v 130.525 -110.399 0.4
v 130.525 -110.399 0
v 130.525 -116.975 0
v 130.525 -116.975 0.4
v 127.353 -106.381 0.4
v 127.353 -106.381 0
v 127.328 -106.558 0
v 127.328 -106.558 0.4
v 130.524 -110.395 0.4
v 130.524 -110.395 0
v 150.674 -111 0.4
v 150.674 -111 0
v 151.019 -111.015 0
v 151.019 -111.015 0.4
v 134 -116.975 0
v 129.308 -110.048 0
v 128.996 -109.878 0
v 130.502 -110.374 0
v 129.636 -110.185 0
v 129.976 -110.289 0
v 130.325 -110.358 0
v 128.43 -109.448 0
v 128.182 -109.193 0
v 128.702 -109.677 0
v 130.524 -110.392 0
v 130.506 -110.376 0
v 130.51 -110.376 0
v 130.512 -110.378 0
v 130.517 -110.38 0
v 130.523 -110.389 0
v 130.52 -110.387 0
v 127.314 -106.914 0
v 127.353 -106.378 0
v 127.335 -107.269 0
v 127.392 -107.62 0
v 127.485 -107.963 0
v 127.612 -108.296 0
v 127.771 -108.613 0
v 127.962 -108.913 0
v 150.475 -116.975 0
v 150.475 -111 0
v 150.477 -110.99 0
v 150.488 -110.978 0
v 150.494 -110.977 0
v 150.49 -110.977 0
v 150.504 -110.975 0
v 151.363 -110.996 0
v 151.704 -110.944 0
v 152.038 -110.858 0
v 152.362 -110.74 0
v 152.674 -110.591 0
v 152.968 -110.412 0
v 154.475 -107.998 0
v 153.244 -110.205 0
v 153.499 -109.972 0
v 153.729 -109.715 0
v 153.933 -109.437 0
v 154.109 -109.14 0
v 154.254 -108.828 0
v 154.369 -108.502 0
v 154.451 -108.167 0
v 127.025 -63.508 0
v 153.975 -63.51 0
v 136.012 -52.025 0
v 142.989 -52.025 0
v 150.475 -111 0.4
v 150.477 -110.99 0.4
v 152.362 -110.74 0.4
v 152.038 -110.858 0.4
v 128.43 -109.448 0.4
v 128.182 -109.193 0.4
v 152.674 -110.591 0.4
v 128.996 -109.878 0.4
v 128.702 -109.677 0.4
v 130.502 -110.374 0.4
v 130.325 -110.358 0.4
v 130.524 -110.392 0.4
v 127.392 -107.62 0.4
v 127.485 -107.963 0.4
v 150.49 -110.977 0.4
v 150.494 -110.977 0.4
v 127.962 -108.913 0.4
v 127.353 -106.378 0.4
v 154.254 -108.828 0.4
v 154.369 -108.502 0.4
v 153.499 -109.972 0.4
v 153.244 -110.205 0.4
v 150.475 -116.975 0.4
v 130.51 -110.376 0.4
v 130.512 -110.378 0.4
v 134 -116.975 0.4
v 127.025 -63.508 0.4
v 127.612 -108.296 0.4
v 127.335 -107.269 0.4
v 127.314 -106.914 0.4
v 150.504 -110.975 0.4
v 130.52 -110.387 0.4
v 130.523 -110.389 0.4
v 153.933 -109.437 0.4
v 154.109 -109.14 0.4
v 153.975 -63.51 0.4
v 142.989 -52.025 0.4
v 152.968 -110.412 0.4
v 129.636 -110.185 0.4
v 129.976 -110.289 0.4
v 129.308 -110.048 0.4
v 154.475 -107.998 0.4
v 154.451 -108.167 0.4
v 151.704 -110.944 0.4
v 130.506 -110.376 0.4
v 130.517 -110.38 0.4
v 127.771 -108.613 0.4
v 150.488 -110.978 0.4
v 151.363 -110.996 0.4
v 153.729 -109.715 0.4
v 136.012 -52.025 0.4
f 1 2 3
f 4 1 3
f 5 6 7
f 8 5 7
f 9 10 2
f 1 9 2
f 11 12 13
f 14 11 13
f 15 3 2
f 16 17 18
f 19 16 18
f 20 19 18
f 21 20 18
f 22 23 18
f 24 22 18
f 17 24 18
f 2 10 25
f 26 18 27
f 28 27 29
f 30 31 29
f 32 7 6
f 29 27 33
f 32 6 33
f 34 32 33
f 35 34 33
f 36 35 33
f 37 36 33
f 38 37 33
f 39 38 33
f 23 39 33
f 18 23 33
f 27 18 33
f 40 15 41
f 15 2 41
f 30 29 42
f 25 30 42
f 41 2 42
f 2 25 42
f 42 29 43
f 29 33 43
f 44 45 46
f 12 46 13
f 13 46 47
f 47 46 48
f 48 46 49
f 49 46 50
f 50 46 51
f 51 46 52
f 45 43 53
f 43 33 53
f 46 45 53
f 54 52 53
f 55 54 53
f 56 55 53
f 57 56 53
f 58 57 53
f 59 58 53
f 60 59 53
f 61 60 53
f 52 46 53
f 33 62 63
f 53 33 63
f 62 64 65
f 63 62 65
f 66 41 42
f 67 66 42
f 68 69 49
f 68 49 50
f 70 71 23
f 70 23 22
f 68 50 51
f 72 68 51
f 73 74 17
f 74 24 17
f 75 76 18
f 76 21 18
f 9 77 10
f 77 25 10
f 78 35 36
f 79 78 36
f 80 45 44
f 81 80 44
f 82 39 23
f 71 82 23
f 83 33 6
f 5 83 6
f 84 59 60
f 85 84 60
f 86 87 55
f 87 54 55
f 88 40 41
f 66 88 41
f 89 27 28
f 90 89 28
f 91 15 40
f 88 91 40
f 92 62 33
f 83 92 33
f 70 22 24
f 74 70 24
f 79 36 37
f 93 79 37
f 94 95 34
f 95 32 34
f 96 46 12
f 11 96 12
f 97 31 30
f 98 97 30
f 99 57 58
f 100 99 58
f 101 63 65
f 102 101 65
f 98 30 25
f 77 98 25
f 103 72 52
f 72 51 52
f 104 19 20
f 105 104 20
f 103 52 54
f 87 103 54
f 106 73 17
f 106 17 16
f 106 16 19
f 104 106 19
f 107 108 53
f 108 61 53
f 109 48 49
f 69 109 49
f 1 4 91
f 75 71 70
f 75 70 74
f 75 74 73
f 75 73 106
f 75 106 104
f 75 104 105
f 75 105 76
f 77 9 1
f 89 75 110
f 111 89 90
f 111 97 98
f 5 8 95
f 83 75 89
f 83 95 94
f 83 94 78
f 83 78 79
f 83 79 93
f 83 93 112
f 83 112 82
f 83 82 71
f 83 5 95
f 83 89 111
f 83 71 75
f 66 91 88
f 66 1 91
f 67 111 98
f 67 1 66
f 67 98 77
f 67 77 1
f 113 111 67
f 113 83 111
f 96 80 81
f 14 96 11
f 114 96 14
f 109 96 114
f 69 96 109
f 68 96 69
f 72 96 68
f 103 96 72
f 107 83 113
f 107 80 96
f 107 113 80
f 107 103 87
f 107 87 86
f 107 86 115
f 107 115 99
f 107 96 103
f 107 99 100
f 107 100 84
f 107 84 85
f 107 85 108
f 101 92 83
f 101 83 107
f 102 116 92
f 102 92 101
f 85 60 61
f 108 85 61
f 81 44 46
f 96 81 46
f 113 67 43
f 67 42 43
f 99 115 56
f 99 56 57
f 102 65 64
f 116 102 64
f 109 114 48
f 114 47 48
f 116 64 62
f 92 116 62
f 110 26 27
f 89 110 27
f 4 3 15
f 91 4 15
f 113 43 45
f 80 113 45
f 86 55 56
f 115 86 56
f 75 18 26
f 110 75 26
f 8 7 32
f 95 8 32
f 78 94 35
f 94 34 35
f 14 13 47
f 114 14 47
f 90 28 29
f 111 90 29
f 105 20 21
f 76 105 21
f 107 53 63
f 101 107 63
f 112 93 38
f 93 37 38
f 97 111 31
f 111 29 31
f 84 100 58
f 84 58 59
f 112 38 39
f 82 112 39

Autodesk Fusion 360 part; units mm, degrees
sketch "KiCad Dongle-Edge_Cuts" plane through (0, 0, 0) normal (0, 1, 0) x (1, 0, 0)
  line L0 (143.0096, -51.9769) -> (143.0098, -51.9771)
  line L1 (143.0098, -51.9771) -> (143.0101, -51.9771)
  line L2 (143.0101, -51.9771) -> (143.0181, -51.9827)
  line L3 (143.0181, -51.9827) -> (154.0181, -63.4827)
  line L4 (154.0181, -63.4827) -> (154.0225, -63.4897)
  line L5 (154.0225, -63.4897) -> (154.023, -63.4902)
  line L6 (154.023, -63.4902) -> (154.0231, -63.4906)
  line L7 (154.0231, -63.4906) -> (154.0233, -63.4909)
  line L8 (154.0233, -63.4909) -> (154.0233, -63.4916)
  line L9 (154.0233, -63.4916) -> (154.025, -63.4997)
  line L10 (154.025, -63.4997) -> (154.525, -107.9997)
  line L11 (154.525, -107.9997) -> (154.5245, -108.0022)
  line L12 (154.5245, -108.0022) -> (154.5247, -108.0035)
  line L13 (154.5247, -108.0035) -> (154.4584, -108.3466)
  line L14 (154.4584, -108.3466) -> (154.3588, -108.6815)
  line L15 (154.3588, -108.6815) -> (154.2268, -109.005)
  line L16 (154.2268, -109.005) -> (154.0637, -109.3141)
  line L17 (154.0637, -109.3141) -> (153.8712, -109.6056)
  line L18 (153.8712, -109.6056) -> (153.651, -109.8769)
  line L19 (153.651, -109.8769) -> (153.4052, -110.1253)
  line L20 (153.4052, -110.1253) -> (153.1363, -110.3484)
  line L21 (153.1363, -110.3484) -> (152.8468, -110.5441)
  line L22 (152.8468, -110.5441) -> (152.5396, -110.7105)
  line L23 (152.5396, -110.7105) -> (152.2175, -110.8459)
  line L24 (152.2175, -110.8459) -> (151.8837, -110.9491)
  line L25 (151.8837, -110.9491) -> (151.5413, -111.0191)
  line L26 (151.5413, -111.0191) -> (151.1938, -111.0553)
  line L27 (151.1938, -111.0553) -> (150.8444, -111.0571)
  line L28 (150.8444, -111.0571) -> (150.525, -111.0274)
  line L29 (150.525, -111.0274) -> (150.525, -117)
  line L30 (150.525, -117) -> (150.5231, -117.0096)
  line L31 (150.5231, -117.0096) -> (150.5096, -117.0231)
  line L32 (150.5096, -117.0231) -> (150.5, -117.025)
  line L33 (150.5, -117.025) -> (134, -117.025)
  line L34 (134, -117.025) -> (130.5, -117.025)
  line L35 (130.5, -117.025) -> (130.4904, -117.0231)
  line L36 (130.4904, -117.0231) -> (130.4769, -117.0096)
  line L37 (130.4769, -117.0096) -> (130.475, -117)
  line L38 (130.475, -117) -> (130.475, -110.4205)
  line L39 (130.475, -110.4205) -> (130.1411, -110.3722)
  line L40 (130.1411, -110.3722) -> (129.7916, -110.2849)
  line L41 (129.7916, -110.2849) -> (129.4527, -110.1627)
  line L42 (129.4527, -110.1627) -> (129.1278, -110.0068)
  line L43 (129.1278, -110.0068) -> (128.8204, -109.819)
  line L44 (128.8204, -109.819) -> (128.5336, -109.601)
  line L45 (128.5336, -109.601) -> (128.2702, -109.3552)
  line L46 (128.2702, -109.3552) -> (128.033, -109.084)
  line L47 (128.033, -109.084) -> (127.8245, -108.7902)
  line L48 (127.8245, -108.7902) -> (127.6467, -108.4768)
  line L49 (127.6467, -108.4768) -> (127.5015, -108.1471)
  line L50 (127.5015, -108.1471) -> (127.3903, -107.8044)
  line L51 (127.3903, -107.8044) -> (127.3144, -107.4522)
  line L52 (127.3144, -107.4522) -> (127.2744, -107.0942)
  line L53 (127.2744, -107.0942) -> (127.2708, -106.7339)
  line L54 (127.2708, -106.7339) -> (127.3034, -106.378)
  line L55 (127.3034, -106.378) -> (126.975, -63.5002)
  line L56 (126.975, -63.5002) -> (126.9761, -63.4946)
  line L57 (126.9761, -63.4946) -> (126.9759, -63.4933)
  line L58 (126.9759, -63.4933) -> (126.9766, -63.492)
  line L59 (126.9766, -63.492) -> (126.9768, -63.4906)
  line L60 (126.9768, -63.4906) -> (126.9777, -63.4897)
  line L61 (126.9777, -63.4897) -> (126.9803, -63.4846)
  line L62 (126.9803, -63.4846) -> (135.9803, -51.9846)
  line L63 (135.9803, -51.9846) -> (135.9877, -51.9782)
  line L64 (135.9877, -51.9782) -> (135.9893, -51.978)
  line L65 (135.9893, -51.978) -> (135.9904, -51.9769)
  line L66 (135.9904, -51.9769) -> (136, -51.975)
  line L67 (136, -51.975) -> (143, -51.975)
  line L68 (143, -51.975) -> (143.0096, -51.9769)
  line L69 (136.0122, -52.025) -> (127.0251, -63.5085)
  line L70 (127.0251, -63.5085) -> (127.3534, -106.3785)
  line L71 (127.3534, -106.3785) -> (127.353, -106.3809)
  line L72 (127.353, -106.3809) -> (127.3532, -106.3822)
  line L73 (127.3532, -106.3822) -> (127.328, -106.5583)
  line L74 (127.328, -106.5583) -> (127.3136, -106.9136)
  line L75 (127.3136, -106.9136) -> (127.3351, -107.2687)
  line L76 (127.3351, -107.2687) -> (127.3924, -107.6197)
  line L77 (127.3924, -107.6197) -> (127.4849, -107.9631)
  line L78 (127.4849, -107.9631) -> (127.6116, -108.2955)
  line L79 (127.6116, -108.2955) -> (127.7712, -108.6133)
  line L80 (127.7712, -108.6133) -> (127.9621, -108.9134)
  line L81 (127.9621, -108.9134) -> (128.1824, -109.1926)
  line L82 (128.1824, -109.1926) -> (128.4298, -109.4482)
  line L83 (128.4298, -109.4482) -> (128.7018, -109.6774)
  line L84 (128.7018, -109.6774) -> (128.9955, -109.878)
  line L85 (128.9955, -109.878) -> (129.308, -110.0479)
  line L86 (129.308, -110.0479) -> (129.636, -110.1853)
  line L87 (129.636, -110.1853) -> (129.9763, -110.2889)
  line L88 (129.9763, -110.2889) -> (130.3253, -110.3575)
  line L89 (130.3253, -110.3575) -> (130.5023, -110.374)
  line L90 (130.5023, -110.374) -> (130.5065, -110.3758)
  line L91 (130.5065, -110.3758) -> (130.5096, -110.3758)
  line L92 (130.5096, -110.3758) -> (130.5119, -110.3782)
  line L93 (130.5119, -110.3782) -> (130.5165, -110.3802)
  line L94 (130.5165, -110.3802) -> (130.5203, -110.3866)
  line L95 (130.5203, -110.3866) -> (130.5231, -110.3894)
  line L96 (130.5231, -110.3894) -> (130.5237, -110.3922)
  line L97 (130.5237, -110.3922) -> (130.5244, -110.3934)
  line L98 (130.5244, -110.3934) -> (130.5242, -110.3951)
  line L99 (130.5242, -110.3951) -> (130.525, -110.3989)
  line L100 (130.525, -110.3989) -> (130.525, -116.975)
  line L101 (130.525, -116.975) -> (134, -116.975)
  line L102 (134, -116.975) -> (150.475, -116.975)
  line L103 (150.475, -116.975) -> (150.475, -111)
  line L104 (150.475, -111) -> (150.4769, -110.9904)
  line L105 (150.4769, -110.9904) -> (150.4774, -110.9899)
  line L106 (150.4774, -110.9899) -> (150.4776, -110.989)
  line L107 (150.4776, -110.989) -> (150.4883, -110.9779)
  line L108 (150.4883, -110.9779) -> (150.4897, -110.9777)
  line L109 (150.4897, -110.9777) -> (150.4904, -110.9769)
  line L110 (150.4904, -110.9769) -> (150.494, -110.9769)
  line L111 (150.494, -110.9769) -> (150.5035, -110.9753)
  line L112 (150.5035, -110.9753) -> (150.6743, -110.9996)
  line L113 (150.6743, -110.9996) -> (151.0189, -111.0147)
  line L114 (151.0189, -111.0147) -> (151.3633, -110.9959)
  line L115 (151.3633, -110.9959) -> (151.7042, -110.9435)
  line L116 (151.7042, -110.9435) -> (152.0383, -110.8579)
  line L117 (152.0383, -110.8579) -> (152.3624, -110.74)
  line L118 (152.3624, -110.74) -> (152.6735, -110.5908)
  line L119 (152.6735, -110.5908) -> (152.9684, -110.4119)
  line L120 (152.9684, -110.4119) -> (153.2443, -110.205)
  line L121 (153.2443, -110.2049) -> (153.4986, -109.9719)
  line L122 (153.4986, -109.9719) -> (153.7289, -109.7151)
  line L123 (153.7289, -109.7151) -> (153.9329, -109.437)
  line L124 (153.9329, -109.437) -> (154.1086, -109.1402)
  line L125 (154.1086, -109.1402) -> (154.2544, -108.8276)
  line L126 (154.2544, -108.8276) -> (154.3688, -108.5022)
  line L127 (154.3688, -108.5022) -> (154.4509, -108.1672)
  line L128 (154.4509, -108.1672) -> (154.475, -107.9984)
  line L129 (154.475, -107.9984) -> (153.9751, -63.5101)
  line L130 (153.9751, -63.5101) -> (142.9893, -52.025)
  line L131 (142.9893, -52.025) -> (136.0122, -52.025)
sketch "KiCad Dongle-Edge_Cuts (1)" plane through (0, 0, 0) normal (0, 0, 1) x (1, 0, 0)
  line L0 (143.0096, -51.9769) -> (143.0098, -51.9771)
  line L1 (143.0098, -51.9771) -> (143.0101, -51.9771)
  line L2 (143.0101, -51.9771) -> (143.0181, -51.9827)
  line L3 (143.0181, -51.9827) -> (154.0181, -63.4827)
  line L4 (154.0181, -63.4827) -> (154.0225, -63.4897)
  line L5 (154.0225, -63.4897) -> (154.023, -63.4902)
  line L6 (154.023, -63.4902) -> (154.0231, -63.4906)
  line L7 (154.0231, -63.4906) -> (154.0233, -63.4909)
  line L8 (154.0233, -63.4909) -> (154.0233, -63.4916)
  line L9 (154.0233, -63.4916) -> (154.025, -63.4997)
  line L10 (154.025, -63.4997) -> (154.525, -107.9997)
  line L11 (154.525, -107.9997) -> (154.5245, -108.0022)
  line L12 (154.5245, -108.0022) -> (154.5247, -108.0035)
  line L13 (154.5247, -108.0035) -> (154.4584, -108.3466)
  line L14 (154.4584, -108.3466) -> (154.3588, -108.6815)
  line L15 (154.3588, -108.6815) -> (154.2268, -109.005)
  line L16 (154.2268, -109.005) -> (154.0637, -109.3141)
  line L17 (154.0637, -109.3141) -> (153.8712, -109.6056)
  line L18 (153.8712, -109.6056) -> (153.651, -109.8769)
  line L19 (153.651, -109.8769) -> (153.4052, -110.1253)
  line L20 (153.4052, -110.1253) -> (153.1363, -110.3484)
  line L21 (153.1363, -110.3484) -> (152.8468, -110.5441)
  line L22 (152.8468, -110.5441) -> (152.5396, -110.7105)
  line L23 (152.5396, -110.7105) -> (152.2175, -110.8459)
  line L24 (152.2175, -110.8459) -> (151.8837, -110.9491)
  line L25 (151.8837, -110.9491) -> (151.5413, -111.0191)
  line L26 (151.5413, -111.0191) -> (151.1938, -111.0553)
  line L27 (151.1938, -111.0553) -> (150.8444, -111.0571)
  line L28 (150.8444, -111.0571) -> (150.525, -111.0274)
  line L29 (150.525, -111.0274) -> (150.525, -117)
  line L30 (150.525, -117) -> (150.5231, -117.0096)
  line L31 (150.5231, -117.0096) -> (150.5096, -117.0231)
  line L32 (150.5096, -117.0231) -> (150.5, -117.025)
  line L33 (150.5, -117.025) -> (134, -117.025)
  line L34 (134, -117.025) -> (130.5, -117.025)
  line L35 (130.5, -117.025) -> (130.4904, -117.0231)
  line L36 (130.4904, -117.0231) -> (130.4769, -117.0096)
  line L37 (130.4769, -117.0096) -> (130.475, -117)
  line L38 (130.475, -117) -> (130.475, -110.4205)
  line L39 (130.475, -110.4205) -> (130.1411, -110.3722)
  line L40 (130.1411, -110.3722) -> (129.7916, -110.2849)
  line L41 (129.7916, -110.2849) -> (129.4527, -110.1627)
  line L42 (129.4527, -110.1627) -> (129.1278, -110.0068)
  line L43 (129.1278, -110.0068) -> (128.8204, -109.819)
  line L44 (128.8204, -109.819) -> (128.5336, -109.601)
  line L45 (128.5336, -109.601) -> (128.2702, -109.3552)
  line L46 (128.2702, -109.3552) -> (128.033, -109.084)
  line L47 (128.033, -109.084) -> (127.8245, -108.7902)
  line L48 (127.8245, -108.7902) -> (127.6467, -108.4768)
  line L49 (127.6467, -108.4768) -> (127.5015, -108.1471)
  line L50 (127.5015, -108.1471) -> (127.3903, -107.8044)
  line L51 (127.3903, -107.8044) -> (127.3144, -107.4522)
  line L52 (127.3144, -107.4522) -> (127.2744, -107.0942)
  line L53 (127.2744, -107.0942) -> (127.2708, -106.7339)
  line L54 (127.2708, -106.7339) -> (127.3034, -106.378)
  line L55 (127.3034, -106.378) -> (126.975, -63.5002)
  line L56 (126.975, -63.5002) -> (126.9761, -63.4946)
  line L57 (126.9761, -63.4946) -> (126.9759, -63.4933)
  line L58 (126.9759, -63.4933) -> (126.9766, -63.492)
  line L59 (126.9766, -63.492) -> (126.9768, -63.4906)
  line L60 (126.9768, -63.4906) -> (126.9777, -63.4897)
  line L61 (126.9777, -63.4897) -> (126.9803, -63.4846)
  line L62 (126.9803, -63.4846) -> (135.9803, -51.9846)
  line L63 (135.9803, -51.9846) -> (135.9877, -51.9782)
  line L64 (135.9877, -51.9782) -> (135.9893, -51.978)
  line L65 (135.9893, -51.978) -> (135.9904, -51.9769)
  line L66 (135.9904, -51.9769) -> (136, -51.975)
  line L67 (136, -51.975) -> (143, -51.975)
  line L68 (143, -51.975) -> (143.0096, -51.9769)
  line L69 (136.0122, -52.025) -> (127.0251, -63.5085)
  line L70 (127.0251, -63.5085) -> (127.3534, -106.3785)
  line L71 (127.3534, -106.3785) -> (127.353, -106.3809)
  line L72 (127.353, -106.3809) -> (127.3532, -106.3822)
  line L73 (127.3532, -106.3822) -> (127.328, -106.5583)
  line L74 (127.328, -106.5583) -> (127.3136, -106.9136)
  line L75 (127.3136, -106.9136) -> (127.3351, -107.2687)
  line L76 (127.3351, -107.2687) -> (127.3924, -107.6197)
  line L77 (127.3924, -107.6197) -> (127.4849, -107.9631)
  line L78 (127.4849, -107.9631) -> (127.6116, -108.2955)
  line L79 (127.6116, -108.2955) -> (127.7712, -108.6133)
  line L80 (127.7712, -108.6133) -> (127.9621, -108.9134)
  line L81 (127.9621, -108.9134) -> (128.1824, -109.1926)
  line L82 (128.1824, -109.1926) -> (128.4298, -109.4482)
  line L83 (128.4298, -109.4482) -> (128.7018, -109.6774)
  line L84 (128.7018, -109.6774) -> (128.9955, -109.878)
  line L85 (128.9955, -109.878) -> (129.308, -110.0479)
  line L86 (129.308, -110.0479) -> (129.636, -110.1853)
  line L87 (129.636, -110.1853) -> (129.9763, -110.2889)
  line L88 (129.9763, -110.2889) -> (130.3253, -110.3575)
  line L89 (130.3253, -110.3575) -> (130.5023, -110.374)
  line L90 (130.5023, -110.374) -> (130.5065, -110.3758)
  line L91 (130.5065, -110.3758) -> (130.5096, -110.3758)
  line L92 (130.5096, -110.3758) -> (130.5119, -110.3782)
  line L93 (130.5119, -110.3782) -> (130.5165, -110.3802)
  line L94 (130.5165, -110.3802) -> (130.5203, -110.3866)
  line L95 (130.5203, -110.3866) -> (130.5231, -110.3894)
  line L96 (130.5231, -110.3894) -> (130.5237, -110.3922)
  line L97 (130.5237, -110.3922) -> (130.5244, -110.3934)
  line L98 (130.5244, -110.3934) -> (130.5242, -110.3951)
  line L99 (130.5242, -110.3951) -> (130.525, -110.3989)
  line L100 (130.525, -110.3989) -> (130.525, -116.975)
  line L101 (130.525, -116.975) -> (134, -116.975)
  line L102 (134, -116.975) -> (150.475, -116.975)
  line L103 (150.475, -116.975) -> (150.475, -111)
  line L104 (150.475, -111) -> (150.4769, -110.9904)
  line L105 (150.4769, -110.9904) -> (150.4774, -110.9899)
  line L106 (150.4774, -110.9899) -> (150.4776, -110.989)
  line L107 (150.4776, -110.989) -> (150.4883, -110.9779)
  line L108 (150.4883, -110.9779) -> (150.4897, -110.9777)
  line L109 (150.4897, -110.9777) -> (150.4904, -110.9769)
  line L110 (150.4904, -110.9769) -> (150.494, -110.9769)
  line L111 (150.494, -110.9769) -> (150.5035, -110.9753)
  line L112 (150.5035, -110.9753) -> (150.6743, -110.9996)
  line L113 (150.6743, -110.9996) -> (151.0189, -111.0147)
  line L114 (151.0189, -111.0147) -> (151.3633, -110.9959)
  line L115 (151.3633, -110.9959) -> (151.7042, -110.9435)
  line L116 (151.7042, -110.9435) -> (152.0383, -110.8579)
  line L117 (152.0383, -110.8579) -> (152.3624, -110.74)
  line L118 (152.3624, -110.74) -> (152.6735, -110.5908)
  line L119 (152.6735, -110.5908) -> (152.9684, -110.4119)
  line L120 (152.9684, -110.4119) -> (153.2443, -110.205)
  line L121 (153.2443, -110.2049) -> (153.4986, -109.9719)
  line L122 (153.4986, -109.9719) -> (153.7289, -109.7151)
  line L123 (153.7289, -109.7151) -> (153.9329, -109.437)
  line L124 (153.9329, -109.437) -> (154.1086, -109.1402)
  line L125 (154.1086, -109.1402) -> (154.2544, -108.8276)
  line L126 (154.2544, -108.8276) -> (154.3688, -108.5022)
  line L127 (154.3688, -108.5022) -> (154.4509, -108.1672)
  line L128 (154.4509, -108.1672) -> (154.475, -107.9984)
  line L129 (154.475, -107.9984) -> (153.9751, -63.5101)
  line L130 (153.9751, -63.5101) -> (142.9893, -52.025)
  line L131 (142.9893, -52.025) -> (136.0122, -52.025)
extrude "Extrude2" add sketch "KiCad Dongle-Edge_Cuts (1)" along normal blind 0.4 contours L69 L70 L71 L73 L74 L75 L76 L77 L78 L79 L80 L81 L82 L83 L84 L85 L86 L87 L88 L89 L90 L91 L92 L93 L94 L95 L96 L98 L99 L100 L101 L102 L103 L104 L107 L109 L110 L111 L112 L113 L114 L115 L116 L117 L118 L119 L120 L121 L122 L123 L124 L125 L126 L127 L128 L129 L130 L131
